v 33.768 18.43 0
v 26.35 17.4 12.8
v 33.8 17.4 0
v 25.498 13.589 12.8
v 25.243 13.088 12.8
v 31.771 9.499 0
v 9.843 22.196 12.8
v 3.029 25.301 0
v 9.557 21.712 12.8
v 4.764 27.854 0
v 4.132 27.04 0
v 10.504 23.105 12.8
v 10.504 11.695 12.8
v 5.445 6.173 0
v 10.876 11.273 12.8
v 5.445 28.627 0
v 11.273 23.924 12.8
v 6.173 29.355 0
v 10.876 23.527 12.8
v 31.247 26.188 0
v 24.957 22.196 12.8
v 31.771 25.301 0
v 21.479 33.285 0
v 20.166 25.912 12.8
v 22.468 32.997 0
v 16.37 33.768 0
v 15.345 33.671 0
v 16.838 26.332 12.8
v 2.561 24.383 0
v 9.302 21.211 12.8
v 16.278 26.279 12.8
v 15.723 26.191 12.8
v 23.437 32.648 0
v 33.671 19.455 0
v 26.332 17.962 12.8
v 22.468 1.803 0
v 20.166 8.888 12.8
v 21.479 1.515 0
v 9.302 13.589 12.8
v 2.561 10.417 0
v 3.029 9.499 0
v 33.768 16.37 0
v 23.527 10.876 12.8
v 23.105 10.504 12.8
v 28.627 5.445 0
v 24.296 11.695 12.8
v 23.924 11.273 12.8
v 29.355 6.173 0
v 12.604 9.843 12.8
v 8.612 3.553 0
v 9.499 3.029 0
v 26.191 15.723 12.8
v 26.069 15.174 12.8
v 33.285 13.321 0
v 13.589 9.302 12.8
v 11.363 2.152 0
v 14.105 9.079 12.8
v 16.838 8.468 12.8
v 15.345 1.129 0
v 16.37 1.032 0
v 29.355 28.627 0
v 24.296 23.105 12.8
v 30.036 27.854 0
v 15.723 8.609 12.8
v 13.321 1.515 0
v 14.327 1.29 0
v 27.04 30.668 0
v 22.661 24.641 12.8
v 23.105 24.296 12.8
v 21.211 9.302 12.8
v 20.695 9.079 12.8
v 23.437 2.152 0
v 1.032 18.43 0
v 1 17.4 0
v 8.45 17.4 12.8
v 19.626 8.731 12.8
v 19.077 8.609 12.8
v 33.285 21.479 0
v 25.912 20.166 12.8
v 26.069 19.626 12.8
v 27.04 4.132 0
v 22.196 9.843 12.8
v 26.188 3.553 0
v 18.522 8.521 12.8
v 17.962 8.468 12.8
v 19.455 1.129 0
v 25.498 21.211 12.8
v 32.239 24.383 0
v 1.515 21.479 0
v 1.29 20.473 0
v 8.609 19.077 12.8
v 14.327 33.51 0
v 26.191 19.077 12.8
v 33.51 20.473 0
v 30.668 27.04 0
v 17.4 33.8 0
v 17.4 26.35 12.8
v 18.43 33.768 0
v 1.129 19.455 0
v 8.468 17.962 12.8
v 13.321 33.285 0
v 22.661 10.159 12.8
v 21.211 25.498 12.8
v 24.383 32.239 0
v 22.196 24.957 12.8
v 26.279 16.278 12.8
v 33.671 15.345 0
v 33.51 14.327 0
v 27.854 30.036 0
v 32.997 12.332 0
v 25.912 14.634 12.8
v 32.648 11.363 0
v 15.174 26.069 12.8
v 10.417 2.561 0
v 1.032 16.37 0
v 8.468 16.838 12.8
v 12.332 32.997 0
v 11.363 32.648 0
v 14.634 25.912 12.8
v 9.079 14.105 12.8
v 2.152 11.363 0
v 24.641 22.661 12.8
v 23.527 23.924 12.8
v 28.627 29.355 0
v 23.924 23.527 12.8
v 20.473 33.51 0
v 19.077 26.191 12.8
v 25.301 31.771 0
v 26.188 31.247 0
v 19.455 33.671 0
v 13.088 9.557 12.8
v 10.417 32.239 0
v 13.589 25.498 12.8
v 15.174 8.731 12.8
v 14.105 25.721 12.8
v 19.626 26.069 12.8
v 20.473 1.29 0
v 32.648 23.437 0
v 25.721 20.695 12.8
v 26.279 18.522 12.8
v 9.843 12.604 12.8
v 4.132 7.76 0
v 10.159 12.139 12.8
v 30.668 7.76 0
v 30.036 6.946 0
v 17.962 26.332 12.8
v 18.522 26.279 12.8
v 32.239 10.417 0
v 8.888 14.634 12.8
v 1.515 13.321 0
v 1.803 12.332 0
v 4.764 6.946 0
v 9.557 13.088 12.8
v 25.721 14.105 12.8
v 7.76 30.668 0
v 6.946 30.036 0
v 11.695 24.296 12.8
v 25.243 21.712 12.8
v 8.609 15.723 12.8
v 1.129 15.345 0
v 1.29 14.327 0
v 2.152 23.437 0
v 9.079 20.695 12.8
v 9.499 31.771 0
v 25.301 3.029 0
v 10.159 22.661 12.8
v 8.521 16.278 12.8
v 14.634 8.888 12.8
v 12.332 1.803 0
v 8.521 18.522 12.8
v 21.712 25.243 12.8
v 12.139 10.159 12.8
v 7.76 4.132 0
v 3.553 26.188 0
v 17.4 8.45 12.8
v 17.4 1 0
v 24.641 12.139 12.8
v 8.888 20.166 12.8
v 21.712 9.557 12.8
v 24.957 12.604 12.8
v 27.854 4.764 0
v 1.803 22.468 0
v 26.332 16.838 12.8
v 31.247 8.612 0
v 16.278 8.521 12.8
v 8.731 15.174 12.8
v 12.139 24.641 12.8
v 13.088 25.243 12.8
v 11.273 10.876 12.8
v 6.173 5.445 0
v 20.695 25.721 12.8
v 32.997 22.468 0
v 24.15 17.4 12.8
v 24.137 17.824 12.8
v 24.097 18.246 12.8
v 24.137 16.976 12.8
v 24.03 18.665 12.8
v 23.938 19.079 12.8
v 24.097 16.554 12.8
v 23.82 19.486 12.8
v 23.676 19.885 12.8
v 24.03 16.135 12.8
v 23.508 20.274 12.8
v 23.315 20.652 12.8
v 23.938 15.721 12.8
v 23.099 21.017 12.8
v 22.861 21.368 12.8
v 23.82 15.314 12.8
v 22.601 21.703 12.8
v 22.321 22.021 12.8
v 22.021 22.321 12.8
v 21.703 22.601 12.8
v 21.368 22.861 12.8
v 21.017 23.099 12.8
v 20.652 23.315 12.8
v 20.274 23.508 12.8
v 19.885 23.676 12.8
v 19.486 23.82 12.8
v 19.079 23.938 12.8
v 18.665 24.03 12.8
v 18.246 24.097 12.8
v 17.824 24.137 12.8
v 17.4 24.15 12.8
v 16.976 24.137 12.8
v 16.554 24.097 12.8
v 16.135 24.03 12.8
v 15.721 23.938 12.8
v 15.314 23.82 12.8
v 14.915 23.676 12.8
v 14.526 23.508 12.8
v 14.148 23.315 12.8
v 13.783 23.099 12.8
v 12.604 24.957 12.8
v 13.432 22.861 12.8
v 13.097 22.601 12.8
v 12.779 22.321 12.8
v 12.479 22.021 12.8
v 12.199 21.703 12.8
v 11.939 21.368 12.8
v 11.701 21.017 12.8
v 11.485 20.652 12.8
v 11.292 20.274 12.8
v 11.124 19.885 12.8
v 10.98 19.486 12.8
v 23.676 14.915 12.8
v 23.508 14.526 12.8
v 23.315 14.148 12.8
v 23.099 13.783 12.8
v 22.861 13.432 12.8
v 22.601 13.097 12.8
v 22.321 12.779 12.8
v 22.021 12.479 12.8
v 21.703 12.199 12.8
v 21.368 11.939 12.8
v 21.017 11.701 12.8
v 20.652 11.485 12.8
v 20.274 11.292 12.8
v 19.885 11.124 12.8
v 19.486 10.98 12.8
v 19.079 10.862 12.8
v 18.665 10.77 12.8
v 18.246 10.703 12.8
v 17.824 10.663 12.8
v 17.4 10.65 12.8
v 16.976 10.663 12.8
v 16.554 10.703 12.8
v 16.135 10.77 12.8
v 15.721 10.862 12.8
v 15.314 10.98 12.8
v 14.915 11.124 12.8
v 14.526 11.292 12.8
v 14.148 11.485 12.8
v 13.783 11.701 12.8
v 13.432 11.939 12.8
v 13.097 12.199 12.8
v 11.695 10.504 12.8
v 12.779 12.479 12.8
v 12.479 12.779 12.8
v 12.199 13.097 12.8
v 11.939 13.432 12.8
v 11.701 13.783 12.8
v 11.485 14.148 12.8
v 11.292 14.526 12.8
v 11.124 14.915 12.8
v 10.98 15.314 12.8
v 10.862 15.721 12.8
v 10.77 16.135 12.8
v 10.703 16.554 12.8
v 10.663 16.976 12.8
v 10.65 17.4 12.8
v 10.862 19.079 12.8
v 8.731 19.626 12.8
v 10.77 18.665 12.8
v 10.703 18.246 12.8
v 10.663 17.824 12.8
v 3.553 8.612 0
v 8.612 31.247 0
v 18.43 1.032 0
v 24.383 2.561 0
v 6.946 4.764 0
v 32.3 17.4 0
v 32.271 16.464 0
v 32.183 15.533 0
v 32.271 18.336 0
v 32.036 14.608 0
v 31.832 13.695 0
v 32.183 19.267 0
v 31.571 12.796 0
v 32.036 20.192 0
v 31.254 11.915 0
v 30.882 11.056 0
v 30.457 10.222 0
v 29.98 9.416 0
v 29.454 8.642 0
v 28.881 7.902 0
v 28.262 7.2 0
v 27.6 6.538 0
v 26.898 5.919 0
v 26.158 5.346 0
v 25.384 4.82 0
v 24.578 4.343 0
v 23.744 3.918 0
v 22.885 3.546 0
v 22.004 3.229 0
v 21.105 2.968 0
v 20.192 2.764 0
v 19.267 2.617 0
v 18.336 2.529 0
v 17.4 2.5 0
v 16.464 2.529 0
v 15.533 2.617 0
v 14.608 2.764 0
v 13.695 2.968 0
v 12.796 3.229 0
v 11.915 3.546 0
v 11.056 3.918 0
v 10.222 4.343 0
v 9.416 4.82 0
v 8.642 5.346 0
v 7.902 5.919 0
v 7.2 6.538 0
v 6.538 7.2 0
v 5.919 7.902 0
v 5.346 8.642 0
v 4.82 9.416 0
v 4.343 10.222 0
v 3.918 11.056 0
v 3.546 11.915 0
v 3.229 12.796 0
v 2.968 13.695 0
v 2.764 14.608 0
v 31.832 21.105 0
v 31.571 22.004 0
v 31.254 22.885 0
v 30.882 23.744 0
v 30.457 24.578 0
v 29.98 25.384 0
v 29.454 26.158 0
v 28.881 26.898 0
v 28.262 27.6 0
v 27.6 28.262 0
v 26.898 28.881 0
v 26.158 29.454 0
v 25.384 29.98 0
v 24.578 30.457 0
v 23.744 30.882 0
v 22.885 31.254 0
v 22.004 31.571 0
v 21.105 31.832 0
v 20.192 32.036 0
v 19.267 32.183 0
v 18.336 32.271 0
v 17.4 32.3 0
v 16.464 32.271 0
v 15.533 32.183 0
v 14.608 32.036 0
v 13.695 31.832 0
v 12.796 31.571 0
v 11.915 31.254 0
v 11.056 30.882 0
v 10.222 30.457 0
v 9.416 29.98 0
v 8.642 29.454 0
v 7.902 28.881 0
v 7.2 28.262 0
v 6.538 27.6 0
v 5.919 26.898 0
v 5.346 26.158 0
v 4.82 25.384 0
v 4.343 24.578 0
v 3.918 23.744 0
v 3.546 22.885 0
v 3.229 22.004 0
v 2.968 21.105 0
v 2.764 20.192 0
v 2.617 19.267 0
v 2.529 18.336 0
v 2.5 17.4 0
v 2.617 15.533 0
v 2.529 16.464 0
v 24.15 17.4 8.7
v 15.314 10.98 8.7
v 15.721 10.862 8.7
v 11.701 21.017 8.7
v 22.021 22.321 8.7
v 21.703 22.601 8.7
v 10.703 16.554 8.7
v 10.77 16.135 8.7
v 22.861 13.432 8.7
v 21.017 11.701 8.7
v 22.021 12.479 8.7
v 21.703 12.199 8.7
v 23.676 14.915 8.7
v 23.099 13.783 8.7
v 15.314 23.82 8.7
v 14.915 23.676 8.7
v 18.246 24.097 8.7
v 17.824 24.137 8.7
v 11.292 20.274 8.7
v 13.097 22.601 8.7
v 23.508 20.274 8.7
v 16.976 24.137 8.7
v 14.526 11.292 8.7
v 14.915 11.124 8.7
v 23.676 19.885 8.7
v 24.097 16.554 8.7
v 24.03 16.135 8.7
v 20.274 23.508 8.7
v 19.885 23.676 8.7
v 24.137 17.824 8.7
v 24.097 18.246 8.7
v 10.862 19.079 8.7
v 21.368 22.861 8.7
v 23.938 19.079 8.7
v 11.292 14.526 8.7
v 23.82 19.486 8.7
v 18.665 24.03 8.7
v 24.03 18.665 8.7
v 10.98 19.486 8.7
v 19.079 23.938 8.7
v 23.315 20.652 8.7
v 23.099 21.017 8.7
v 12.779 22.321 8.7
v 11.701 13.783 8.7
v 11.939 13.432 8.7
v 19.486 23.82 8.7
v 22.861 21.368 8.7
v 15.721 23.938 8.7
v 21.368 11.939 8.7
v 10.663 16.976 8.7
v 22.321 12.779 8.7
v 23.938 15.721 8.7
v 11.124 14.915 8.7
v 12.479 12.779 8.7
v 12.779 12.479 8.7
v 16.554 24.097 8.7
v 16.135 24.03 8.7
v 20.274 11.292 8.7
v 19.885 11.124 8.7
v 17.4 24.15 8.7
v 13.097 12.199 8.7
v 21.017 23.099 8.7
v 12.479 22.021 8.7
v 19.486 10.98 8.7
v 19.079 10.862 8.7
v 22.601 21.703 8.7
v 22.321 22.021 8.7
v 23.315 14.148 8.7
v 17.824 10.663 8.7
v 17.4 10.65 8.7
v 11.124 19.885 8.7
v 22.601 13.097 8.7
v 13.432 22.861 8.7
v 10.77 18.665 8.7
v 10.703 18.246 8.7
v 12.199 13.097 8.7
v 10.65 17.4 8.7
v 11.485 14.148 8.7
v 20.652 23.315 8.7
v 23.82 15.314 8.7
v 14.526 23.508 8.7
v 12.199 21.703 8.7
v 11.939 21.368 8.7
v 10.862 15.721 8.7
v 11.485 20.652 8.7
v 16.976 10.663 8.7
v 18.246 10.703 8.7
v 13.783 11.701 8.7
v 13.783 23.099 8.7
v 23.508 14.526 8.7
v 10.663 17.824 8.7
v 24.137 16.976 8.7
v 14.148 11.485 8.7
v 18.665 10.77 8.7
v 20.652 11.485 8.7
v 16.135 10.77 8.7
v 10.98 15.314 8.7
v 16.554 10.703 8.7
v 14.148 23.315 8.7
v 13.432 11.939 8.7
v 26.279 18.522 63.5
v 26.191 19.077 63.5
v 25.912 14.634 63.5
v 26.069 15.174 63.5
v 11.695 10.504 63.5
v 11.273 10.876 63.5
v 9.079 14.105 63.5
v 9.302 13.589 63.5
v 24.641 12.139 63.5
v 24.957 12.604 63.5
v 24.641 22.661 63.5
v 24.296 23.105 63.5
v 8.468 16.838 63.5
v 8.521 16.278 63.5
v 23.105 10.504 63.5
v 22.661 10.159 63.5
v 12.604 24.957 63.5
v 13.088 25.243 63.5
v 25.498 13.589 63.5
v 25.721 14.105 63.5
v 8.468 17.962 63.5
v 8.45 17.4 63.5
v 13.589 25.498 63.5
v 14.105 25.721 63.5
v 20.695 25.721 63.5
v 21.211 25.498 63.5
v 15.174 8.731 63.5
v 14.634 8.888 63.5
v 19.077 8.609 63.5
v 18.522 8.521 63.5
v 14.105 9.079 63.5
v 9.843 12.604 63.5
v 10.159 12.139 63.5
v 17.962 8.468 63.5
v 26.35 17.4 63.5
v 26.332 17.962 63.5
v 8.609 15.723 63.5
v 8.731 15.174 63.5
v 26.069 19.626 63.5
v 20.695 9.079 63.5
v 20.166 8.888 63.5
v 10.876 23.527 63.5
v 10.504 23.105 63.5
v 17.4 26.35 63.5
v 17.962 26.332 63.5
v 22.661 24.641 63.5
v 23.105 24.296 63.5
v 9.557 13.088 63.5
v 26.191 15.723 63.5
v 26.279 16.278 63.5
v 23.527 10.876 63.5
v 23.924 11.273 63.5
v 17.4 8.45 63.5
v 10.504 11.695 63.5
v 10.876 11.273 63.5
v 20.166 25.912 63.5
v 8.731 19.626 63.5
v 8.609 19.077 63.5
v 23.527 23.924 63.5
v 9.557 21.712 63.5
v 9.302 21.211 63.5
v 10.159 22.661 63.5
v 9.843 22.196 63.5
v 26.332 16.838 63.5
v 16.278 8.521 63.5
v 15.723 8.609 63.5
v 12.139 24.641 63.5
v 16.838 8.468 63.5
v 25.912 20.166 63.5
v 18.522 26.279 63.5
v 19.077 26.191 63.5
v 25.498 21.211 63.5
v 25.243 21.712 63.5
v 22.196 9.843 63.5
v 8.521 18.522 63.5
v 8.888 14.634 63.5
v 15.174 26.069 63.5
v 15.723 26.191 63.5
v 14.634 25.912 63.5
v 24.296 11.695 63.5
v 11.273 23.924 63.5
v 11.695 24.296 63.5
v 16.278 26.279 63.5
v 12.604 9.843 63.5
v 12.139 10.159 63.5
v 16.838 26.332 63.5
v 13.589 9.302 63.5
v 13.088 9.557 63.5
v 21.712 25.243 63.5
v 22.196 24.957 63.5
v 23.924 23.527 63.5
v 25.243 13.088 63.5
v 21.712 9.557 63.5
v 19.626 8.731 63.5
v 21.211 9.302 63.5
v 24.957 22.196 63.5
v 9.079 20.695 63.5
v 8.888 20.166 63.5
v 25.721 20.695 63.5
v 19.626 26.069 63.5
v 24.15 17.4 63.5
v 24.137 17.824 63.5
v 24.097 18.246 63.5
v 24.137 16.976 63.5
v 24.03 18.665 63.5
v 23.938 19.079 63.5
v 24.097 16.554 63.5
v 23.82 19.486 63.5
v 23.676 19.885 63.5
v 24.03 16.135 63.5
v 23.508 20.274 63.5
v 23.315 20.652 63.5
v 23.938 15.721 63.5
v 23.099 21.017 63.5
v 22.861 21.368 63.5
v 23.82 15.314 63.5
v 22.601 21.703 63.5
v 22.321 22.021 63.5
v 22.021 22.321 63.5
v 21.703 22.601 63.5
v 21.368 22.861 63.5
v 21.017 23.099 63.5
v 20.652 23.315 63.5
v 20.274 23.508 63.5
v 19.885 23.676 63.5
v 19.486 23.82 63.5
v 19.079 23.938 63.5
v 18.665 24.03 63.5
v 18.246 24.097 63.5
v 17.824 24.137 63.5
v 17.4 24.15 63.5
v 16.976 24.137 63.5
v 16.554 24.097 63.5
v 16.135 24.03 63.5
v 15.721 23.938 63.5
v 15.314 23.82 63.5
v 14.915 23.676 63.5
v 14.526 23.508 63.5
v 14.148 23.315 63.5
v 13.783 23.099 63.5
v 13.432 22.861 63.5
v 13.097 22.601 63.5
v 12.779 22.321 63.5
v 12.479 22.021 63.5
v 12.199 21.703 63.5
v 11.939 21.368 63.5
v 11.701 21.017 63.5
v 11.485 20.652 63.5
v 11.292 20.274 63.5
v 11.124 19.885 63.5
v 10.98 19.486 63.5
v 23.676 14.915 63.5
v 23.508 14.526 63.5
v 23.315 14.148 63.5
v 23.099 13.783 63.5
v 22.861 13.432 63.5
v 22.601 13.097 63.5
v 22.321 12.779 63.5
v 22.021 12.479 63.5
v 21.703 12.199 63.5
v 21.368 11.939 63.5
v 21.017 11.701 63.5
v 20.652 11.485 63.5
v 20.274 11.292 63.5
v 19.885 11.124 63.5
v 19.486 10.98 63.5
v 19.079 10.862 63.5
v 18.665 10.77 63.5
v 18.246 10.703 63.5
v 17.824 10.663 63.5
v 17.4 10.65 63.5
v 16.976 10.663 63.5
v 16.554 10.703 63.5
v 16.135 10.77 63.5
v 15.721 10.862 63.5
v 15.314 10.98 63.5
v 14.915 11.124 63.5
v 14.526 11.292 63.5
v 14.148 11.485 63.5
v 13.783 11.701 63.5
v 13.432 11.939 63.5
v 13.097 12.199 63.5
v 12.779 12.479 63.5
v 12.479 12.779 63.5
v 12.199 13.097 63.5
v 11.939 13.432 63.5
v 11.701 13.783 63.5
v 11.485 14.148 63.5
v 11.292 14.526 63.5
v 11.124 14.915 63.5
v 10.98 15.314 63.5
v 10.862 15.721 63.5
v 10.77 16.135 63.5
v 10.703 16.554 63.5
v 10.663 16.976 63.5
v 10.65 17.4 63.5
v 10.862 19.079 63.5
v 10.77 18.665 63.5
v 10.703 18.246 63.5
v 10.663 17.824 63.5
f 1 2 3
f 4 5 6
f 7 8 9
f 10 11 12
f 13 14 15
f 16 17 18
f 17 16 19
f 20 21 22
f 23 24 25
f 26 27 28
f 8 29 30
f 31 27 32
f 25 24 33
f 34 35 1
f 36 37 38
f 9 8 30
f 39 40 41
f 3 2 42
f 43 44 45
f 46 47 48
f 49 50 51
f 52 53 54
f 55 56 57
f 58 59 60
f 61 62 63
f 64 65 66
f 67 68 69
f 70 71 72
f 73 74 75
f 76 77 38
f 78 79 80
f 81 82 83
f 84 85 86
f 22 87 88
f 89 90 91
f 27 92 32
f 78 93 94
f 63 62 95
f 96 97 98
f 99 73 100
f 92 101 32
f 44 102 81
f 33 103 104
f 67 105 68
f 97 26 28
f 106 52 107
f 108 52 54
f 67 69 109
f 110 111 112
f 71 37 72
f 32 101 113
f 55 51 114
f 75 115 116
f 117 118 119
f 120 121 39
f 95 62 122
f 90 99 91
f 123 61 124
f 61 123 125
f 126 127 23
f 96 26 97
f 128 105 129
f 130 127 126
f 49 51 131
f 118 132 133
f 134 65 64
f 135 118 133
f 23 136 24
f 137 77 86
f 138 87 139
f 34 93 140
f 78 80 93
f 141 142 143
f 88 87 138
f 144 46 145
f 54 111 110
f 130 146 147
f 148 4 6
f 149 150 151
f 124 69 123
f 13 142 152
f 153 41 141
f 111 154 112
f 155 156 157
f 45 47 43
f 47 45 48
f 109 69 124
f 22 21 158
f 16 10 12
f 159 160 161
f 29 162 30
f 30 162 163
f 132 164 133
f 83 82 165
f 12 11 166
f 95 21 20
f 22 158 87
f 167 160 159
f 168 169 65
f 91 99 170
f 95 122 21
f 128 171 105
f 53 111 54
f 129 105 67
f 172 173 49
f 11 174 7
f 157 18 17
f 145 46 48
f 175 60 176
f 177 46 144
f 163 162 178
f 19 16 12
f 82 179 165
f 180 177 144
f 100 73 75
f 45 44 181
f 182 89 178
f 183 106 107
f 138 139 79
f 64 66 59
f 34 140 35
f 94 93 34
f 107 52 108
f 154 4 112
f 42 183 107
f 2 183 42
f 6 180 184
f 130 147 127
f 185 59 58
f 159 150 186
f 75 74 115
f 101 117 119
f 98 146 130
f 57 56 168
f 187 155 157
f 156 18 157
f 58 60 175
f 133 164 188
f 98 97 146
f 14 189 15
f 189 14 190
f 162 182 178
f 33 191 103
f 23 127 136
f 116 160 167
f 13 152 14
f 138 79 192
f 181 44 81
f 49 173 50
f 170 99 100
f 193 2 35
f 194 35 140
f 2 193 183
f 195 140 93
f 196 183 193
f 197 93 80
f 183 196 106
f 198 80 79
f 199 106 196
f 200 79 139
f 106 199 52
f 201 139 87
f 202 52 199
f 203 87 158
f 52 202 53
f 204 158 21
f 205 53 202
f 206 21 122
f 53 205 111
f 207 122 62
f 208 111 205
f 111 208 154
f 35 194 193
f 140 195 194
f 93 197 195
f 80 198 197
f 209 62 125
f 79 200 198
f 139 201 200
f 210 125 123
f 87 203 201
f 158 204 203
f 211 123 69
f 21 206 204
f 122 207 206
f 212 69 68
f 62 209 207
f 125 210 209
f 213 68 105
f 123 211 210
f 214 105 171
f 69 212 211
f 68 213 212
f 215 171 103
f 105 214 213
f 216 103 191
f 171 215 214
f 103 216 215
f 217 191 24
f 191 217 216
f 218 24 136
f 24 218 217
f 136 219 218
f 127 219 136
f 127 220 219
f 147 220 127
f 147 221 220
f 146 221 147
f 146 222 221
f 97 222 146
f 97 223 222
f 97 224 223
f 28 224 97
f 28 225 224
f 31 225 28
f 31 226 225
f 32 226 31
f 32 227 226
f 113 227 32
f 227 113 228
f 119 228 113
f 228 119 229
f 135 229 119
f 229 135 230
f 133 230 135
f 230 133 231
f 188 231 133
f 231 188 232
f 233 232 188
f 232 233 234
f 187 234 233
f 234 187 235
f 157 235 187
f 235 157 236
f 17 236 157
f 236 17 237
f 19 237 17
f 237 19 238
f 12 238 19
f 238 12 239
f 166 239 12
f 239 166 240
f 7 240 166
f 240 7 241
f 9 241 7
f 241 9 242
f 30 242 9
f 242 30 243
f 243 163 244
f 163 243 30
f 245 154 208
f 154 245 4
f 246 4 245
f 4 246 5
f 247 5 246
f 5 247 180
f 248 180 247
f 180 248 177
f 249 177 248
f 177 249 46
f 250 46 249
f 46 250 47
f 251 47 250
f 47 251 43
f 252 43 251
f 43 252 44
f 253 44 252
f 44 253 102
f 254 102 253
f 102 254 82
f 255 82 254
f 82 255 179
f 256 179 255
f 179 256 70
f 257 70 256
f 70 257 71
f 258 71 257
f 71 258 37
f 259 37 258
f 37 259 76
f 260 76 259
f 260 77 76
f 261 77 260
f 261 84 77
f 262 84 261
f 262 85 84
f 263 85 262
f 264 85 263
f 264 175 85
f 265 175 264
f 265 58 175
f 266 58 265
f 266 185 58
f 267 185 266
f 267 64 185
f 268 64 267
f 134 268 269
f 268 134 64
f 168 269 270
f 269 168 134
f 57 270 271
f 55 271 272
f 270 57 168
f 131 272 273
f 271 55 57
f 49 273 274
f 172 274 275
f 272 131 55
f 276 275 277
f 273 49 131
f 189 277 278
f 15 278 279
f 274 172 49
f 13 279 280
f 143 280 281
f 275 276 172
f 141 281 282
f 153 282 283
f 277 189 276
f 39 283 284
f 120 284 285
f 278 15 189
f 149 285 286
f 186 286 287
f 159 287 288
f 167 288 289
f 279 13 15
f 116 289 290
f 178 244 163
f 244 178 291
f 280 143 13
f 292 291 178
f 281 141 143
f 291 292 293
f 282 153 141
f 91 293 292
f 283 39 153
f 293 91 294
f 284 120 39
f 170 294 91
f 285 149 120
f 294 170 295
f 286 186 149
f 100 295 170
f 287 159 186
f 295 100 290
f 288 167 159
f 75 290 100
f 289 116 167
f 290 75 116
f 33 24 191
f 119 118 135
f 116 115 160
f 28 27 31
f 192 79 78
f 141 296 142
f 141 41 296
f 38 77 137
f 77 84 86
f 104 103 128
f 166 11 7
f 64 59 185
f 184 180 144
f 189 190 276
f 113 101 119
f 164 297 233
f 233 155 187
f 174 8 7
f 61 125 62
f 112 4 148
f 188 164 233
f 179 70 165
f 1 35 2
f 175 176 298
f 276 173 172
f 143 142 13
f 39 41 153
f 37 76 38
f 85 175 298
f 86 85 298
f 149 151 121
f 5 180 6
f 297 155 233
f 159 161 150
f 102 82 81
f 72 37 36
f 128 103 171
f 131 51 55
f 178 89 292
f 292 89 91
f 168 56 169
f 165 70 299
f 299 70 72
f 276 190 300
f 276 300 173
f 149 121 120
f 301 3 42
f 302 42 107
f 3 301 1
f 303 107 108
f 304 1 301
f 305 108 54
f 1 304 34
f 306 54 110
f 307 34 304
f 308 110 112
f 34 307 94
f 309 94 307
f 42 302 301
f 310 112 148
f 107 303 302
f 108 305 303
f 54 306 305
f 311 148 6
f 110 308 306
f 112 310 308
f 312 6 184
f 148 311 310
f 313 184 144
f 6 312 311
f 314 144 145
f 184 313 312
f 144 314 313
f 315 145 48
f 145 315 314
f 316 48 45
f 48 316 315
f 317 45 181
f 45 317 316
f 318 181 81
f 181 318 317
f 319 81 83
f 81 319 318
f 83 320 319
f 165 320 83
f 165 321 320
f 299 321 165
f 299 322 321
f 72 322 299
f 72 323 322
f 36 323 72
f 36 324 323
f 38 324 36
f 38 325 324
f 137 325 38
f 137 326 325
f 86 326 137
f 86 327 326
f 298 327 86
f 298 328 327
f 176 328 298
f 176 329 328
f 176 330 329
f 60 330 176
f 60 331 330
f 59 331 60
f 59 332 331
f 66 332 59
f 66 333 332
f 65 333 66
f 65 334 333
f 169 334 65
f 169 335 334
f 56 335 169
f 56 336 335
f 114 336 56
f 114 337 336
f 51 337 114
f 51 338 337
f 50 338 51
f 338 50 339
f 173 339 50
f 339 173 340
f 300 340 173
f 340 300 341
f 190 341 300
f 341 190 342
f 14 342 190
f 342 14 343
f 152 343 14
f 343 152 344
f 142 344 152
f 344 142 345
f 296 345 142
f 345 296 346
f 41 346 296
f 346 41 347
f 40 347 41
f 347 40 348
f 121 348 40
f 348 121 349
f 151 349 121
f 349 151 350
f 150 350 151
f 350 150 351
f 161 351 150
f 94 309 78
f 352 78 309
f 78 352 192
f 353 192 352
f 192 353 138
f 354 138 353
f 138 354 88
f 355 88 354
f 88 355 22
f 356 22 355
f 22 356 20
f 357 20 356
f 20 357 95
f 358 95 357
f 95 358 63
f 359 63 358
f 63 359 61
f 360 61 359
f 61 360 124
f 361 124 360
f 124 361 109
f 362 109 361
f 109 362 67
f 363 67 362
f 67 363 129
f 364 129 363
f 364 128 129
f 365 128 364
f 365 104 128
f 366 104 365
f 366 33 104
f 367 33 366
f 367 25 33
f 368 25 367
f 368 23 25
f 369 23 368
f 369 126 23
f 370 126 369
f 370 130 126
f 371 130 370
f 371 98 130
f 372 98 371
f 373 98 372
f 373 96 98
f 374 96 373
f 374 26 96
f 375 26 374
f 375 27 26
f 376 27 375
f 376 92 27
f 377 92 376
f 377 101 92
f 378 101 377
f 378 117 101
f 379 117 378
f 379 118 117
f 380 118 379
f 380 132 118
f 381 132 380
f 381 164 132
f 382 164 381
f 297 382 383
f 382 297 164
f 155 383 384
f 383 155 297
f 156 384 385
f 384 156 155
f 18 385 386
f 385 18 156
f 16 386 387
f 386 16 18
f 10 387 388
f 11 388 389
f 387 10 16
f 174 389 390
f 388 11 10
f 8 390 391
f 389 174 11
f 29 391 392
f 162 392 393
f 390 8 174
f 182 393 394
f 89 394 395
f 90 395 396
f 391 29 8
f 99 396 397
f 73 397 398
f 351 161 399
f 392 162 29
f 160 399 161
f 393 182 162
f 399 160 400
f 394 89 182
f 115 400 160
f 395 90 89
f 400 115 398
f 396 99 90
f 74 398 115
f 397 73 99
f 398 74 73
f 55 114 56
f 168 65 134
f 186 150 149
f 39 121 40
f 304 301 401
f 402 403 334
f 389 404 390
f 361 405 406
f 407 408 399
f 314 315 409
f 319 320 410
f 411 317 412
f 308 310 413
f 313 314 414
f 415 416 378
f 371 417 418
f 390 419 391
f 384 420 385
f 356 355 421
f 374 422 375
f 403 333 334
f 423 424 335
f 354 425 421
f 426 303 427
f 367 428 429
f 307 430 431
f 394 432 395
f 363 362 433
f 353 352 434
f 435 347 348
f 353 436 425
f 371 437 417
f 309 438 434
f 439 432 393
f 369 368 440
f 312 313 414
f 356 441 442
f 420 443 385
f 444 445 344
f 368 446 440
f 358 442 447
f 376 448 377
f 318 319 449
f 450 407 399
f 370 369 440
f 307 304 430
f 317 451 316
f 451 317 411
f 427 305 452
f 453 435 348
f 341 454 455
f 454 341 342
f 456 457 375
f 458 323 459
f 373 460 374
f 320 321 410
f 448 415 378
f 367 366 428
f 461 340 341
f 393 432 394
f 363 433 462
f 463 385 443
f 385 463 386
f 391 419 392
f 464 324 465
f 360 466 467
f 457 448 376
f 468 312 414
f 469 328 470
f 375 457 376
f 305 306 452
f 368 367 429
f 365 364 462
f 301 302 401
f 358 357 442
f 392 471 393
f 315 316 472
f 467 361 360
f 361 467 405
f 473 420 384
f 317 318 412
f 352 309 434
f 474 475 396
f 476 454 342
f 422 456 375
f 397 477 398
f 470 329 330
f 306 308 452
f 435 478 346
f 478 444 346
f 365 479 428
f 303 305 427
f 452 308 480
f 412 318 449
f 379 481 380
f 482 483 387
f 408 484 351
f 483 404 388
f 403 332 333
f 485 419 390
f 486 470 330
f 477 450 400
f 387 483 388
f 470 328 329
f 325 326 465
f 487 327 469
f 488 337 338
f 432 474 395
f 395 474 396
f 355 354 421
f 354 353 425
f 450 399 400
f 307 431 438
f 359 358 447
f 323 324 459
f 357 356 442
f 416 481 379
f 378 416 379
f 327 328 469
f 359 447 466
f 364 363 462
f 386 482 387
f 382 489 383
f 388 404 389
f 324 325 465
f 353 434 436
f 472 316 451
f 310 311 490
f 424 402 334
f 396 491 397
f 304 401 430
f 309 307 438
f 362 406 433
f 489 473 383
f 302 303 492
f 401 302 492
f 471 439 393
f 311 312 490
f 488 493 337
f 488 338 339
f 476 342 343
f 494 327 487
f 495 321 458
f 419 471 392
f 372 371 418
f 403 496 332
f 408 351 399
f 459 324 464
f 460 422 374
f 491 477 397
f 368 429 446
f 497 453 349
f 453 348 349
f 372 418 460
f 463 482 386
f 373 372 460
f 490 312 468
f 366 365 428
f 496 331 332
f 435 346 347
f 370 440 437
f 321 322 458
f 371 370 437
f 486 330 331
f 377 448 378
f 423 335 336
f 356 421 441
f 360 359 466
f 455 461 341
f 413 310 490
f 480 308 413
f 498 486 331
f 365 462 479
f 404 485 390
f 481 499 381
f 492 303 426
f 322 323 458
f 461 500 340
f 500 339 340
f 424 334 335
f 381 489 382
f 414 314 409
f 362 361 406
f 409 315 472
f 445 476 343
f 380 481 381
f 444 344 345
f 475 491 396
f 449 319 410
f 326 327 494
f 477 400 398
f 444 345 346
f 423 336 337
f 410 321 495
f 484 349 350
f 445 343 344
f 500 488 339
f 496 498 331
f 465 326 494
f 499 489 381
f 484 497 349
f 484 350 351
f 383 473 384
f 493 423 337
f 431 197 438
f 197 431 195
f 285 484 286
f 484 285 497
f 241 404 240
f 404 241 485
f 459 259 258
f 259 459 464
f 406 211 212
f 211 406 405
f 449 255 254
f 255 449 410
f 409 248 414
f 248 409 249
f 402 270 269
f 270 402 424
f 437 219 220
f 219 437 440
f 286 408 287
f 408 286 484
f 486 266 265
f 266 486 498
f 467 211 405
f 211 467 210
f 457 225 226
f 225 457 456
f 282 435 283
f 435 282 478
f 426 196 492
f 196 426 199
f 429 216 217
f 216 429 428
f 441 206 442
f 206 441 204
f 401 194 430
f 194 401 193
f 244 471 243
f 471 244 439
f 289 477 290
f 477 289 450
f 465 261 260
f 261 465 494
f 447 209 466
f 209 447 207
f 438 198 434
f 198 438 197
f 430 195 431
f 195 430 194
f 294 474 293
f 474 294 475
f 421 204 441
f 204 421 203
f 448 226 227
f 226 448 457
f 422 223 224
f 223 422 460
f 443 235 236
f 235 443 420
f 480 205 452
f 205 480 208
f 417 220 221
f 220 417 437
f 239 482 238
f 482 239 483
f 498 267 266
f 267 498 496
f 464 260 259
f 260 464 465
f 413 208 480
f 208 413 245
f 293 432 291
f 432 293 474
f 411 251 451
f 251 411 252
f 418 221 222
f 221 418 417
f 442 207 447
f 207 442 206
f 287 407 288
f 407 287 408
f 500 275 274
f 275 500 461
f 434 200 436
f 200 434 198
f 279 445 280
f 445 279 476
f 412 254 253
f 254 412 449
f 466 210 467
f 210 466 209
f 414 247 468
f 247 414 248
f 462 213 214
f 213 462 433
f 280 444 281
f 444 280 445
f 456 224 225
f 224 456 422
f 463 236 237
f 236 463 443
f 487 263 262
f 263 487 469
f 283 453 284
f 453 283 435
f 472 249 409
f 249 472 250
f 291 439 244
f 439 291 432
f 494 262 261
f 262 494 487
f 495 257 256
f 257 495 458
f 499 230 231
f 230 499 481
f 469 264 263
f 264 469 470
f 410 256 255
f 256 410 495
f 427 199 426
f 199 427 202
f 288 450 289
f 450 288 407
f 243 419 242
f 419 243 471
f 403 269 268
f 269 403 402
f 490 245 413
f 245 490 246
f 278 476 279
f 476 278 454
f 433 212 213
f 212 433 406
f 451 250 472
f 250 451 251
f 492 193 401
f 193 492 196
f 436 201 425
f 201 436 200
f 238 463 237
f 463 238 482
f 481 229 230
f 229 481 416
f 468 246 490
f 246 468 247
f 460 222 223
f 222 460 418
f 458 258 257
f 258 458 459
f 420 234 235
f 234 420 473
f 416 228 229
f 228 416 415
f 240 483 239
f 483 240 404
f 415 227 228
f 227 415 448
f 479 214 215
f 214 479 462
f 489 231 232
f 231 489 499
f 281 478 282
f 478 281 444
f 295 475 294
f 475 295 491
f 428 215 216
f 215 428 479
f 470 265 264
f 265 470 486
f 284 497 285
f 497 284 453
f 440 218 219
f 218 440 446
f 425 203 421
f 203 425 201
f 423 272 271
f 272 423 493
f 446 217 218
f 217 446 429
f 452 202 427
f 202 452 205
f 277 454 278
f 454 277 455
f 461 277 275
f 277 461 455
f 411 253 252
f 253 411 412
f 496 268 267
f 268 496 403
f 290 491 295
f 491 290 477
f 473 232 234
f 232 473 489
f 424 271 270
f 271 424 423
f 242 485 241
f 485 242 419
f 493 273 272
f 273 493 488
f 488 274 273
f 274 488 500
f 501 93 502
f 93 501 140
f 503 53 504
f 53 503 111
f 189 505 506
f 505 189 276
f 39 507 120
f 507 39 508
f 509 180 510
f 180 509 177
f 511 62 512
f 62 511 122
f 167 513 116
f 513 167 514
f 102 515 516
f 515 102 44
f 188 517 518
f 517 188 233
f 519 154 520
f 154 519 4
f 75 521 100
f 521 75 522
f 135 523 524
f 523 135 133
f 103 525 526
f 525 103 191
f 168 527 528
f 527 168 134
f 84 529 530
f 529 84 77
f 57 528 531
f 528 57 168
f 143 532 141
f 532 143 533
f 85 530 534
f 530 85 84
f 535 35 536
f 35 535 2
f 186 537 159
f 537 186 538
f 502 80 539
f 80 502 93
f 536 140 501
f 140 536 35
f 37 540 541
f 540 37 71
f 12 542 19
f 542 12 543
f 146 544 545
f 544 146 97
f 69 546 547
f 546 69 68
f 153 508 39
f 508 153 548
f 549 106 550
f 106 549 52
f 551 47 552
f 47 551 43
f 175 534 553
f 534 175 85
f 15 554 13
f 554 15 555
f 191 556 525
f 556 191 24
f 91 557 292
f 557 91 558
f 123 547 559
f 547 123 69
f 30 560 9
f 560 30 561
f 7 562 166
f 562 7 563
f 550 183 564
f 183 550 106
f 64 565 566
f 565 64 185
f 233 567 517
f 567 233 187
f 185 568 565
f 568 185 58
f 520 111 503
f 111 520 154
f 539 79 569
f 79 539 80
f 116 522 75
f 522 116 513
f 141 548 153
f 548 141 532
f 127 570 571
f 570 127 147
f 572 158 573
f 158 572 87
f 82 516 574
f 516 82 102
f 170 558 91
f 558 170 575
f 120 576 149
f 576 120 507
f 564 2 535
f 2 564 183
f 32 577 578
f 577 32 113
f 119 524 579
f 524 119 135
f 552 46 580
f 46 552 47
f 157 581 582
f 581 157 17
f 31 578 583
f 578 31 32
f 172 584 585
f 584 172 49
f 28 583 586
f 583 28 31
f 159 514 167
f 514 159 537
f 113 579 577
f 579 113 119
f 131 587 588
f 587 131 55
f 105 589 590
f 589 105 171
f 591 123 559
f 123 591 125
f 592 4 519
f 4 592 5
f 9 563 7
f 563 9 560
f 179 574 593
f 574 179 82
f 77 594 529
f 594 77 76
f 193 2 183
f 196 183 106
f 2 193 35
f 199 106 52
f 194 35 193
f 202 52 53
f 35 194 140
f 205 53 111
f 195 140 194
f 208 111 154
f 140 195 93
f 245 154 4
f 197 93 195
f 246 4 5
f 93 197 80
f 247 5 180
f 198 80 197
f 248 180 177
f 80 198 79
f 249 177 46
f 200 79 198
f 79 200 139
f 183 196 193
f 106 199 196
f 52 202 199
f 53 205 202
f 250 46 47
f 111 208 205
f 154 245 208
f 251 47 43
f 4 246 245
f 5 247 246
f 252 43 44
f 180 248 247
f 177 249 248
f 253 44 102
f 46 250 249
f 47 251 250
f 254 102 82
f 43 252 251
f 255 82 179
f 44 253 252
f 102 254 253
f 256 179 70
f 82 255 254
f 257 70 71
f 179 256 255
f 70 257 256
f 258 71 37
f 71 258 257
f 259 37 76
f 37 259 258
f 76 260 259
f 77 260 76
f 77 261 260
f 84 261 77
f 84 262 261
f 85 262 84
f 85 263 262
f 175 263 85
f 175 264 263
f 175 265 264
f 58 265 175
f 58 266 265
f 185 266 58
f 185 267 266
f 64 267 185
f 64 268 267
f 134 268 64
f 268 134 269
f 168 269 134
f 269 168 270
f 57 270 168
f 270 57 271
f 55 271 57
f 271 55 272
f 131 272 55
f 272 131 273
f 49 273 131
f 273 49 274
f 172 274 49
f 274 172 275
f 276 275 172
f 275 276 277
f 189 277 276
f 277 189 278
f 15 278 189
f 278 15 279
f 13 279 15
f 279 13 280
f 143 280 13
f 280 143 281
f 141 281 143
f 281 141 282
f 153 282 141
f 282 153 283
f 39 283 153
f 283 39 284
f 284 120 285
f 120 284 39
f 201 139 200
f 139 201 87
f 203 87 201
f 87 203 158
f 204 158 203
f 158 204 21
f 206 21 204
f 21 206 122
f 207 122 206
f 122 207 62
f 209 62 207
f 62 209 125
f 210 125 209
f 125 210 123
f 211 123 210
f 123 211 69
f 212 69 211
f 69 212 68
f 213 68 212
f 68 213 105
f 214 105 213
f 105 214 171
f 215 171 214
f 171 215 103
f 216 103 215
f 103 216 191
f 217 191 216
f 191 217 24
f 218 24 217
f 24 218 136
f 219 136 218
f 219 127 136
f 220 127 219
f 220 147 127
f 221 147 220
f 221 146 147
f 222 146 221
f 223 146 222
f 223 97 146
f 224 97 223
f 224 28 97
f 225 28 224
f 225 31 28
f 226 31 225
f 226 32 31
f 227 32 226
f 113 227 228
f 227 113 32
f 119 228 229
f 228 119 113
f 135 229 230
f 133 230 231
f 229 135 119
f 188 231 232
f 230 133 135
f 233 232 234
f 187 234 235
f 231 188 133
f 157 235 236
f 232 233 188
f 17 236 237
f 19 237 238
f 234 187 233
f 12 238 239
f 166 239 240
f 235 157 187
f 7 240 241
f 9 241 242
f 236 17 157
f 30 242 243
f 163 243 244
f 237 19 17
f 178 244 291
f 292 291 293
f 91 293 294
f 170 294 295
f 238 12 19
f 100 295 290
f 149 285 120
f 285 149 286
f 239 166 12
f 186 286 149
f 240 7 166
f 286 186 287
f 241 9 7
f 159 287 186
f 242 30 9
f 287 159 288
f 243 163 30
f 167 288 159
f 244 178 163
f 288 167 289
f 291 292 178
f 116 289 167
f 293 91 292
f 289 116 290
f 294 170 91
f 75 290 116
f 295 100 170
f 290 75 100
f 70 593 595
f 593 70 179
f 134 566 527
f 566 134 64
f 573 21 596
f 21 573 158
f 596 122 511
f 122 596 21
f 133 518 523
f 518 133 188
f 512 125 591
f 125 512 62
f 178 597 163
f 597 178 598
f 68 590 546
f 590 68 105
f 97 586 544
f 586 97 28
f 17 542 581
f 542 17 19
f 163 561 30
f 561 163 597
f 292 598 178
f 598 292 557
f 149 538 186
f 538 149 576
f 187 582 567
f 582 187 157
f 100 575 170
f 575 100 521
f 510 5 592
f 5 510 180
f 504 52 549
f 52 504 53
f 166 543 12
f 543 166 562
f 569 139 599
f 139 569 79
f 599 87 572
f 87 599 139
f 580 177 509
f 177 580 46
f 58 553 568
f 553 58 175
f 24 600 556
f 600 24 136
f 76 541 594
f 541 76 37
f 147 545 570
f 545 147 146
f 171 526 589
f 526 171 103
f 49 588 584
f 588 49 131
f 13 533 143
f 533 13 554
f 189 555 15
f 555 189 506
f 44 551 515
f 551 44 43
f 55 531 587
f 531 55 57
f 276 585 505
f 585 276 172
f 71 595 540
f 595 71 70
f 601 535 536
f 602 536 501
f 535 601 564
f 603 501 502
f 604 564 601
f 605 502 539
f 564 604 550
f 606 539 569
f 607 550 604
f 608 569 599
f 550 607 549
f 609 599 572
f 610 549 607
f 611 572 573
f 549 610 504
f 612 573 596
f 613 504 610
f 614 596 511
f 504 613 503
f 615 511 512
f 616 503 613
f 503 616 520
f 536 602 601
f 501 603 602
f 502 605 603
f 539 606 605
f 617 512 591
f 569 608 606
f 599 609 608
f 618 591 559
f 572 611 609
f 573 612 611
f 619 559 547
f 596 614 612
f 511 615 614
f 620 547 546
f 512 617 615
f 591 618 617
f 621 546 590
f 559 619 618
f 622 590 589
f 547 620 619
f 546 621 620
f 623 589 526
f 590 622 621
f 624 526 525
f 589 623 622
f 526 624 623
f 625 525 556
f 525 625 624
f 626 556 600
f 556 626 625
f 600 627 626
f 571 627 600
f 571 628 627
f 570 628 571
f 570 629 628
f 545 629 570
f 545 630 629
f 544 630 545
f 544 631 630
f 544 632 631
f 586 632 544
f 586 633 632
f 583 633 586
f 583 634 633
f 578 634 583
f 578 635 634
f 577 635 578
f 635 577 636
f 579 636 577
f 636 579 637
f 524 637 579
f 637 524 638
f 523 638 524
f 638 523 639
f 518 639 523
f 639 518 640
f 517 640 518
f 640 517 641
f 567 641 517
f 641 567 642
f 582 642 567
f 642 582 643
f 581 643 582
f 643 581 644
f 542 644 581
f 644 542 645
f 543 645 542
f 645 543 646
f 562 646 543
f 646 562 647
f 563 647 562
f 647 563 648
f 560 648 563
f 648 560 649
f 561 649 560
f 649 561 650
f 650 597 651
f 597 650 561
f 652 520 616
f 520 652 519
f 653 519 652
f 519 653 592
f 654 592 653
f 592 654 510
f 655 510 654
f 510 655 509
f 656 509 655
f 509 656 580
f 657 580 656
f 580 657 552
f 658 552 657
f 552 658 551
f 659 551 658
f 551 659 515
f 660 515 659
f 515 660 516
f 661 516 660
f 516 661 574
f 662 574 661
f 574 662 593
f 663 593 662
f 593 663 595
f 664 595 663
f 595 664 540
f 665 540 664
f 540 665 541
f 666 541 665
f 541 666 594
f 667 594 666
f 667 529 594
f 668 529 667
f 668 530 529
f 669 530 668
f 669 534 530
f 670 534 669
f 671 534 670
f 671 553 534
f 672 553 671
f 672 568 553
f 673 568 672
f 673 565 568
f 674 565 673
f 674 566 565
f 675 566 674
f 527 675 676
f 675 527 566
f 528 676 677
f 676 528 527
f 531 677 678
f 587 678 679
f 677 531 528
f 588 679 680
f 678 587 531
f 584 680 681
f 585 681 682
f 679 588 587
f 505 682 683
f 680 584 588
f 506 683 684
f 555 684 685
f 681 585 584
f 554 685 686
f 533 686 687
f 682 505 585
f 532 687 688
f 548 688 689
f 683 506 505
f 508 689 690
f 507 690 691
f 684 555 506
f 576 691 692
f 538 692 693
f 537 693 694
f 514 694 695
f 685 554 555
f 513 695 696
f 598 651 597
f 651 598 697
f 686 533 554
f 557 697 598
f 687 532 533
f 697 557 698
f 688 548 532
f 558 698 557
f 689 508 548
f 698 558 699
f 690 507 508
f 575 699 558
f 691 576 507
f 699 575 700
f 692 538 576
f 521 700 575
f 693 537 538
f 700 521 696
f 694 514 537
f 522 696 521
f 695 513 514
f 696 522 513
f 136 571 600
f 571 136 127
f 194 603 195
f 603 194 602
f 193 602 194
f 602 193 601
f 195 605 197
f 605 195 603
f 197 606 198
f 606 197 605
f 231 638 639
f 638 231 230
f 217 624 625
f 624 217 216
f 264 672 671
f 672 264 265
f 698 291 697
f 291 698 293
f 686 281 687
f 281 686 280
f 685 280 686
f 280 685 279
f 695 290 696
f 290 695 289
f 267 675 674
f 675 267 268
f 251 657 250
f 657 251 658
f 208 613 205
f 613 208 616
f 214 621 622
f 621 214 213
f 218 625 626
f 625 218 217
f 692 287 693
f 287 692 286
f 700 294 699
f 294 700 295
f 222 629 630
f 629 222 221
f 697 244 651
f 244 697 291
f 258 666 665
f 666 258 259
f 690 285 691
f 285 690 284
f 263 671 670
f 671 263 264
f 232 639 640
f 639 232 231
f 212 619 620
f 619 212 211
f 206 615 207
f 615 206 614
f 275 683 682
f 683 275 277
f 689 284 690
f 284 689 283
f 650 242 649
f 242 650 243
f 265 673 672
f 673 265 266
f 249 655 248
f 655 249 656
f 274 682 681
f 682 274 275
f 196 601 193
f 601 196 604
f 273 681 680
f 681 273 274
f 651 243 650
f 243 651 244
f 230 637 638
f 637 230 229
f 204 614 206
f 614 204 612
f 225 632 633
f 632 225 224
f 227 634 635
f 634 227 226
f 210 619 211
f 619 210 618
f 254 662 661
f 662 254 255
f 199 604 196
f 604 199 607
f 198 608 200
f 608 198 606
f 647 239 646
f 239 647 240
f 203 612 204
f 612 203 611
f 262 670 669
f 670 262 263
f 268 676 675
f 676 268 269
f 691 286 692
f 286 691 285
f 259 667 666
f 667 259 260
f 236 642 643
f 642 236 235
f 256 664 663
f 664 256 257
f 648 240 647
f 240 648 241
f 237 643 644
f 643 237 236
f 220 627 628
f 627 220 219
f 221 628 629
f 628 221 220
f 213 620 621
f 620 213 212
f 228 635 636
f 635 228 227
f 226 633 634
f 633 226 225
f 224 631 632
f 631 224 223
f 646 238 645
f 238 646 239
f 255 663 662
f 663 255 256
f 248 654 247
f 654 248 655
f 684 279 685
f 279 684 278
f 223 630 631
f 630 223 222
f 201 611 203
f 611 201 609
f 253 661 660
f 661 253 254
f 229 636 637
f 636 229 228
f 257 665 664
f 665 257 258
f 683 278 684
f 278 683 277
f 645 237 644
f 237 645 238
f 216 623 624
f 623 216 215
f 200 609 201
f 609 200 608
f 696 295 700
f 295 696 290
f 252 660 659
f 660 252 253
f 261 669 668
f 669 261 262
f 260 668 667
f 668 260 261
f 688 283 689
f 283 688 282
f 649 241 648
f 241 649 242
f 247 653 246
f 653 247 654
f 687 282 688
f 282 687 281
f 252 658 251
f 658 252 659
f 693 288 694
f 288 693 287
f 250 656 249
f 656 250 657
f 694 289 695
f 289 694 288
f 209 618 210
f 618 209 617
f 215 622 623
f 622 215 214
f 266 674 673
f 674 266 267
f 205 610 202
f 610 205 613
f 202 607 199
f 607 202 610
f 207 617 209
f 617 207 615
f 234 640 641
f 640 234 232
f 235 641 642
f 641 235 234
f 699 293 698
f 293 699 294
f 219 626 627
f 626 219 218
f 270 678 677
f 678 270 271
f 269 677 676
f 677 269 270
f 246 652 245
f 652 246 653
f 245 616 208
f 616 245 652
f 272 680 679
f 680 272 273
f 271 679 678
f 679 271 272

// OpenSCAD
// single funnel v1.2
module funnel () {
		// Part 1, funnel

		// diameter 32.8 (radius , place (x.y) such that there is 1mm margin
		translate([17.4, 17.4, 0])
		union() {
			difference() { 	
				cylinder(h = 12.8, r1 = 16.4, r2 = 8.95, $fn = 100);		
				cylinder(h = 8.7, r1 = 14.9, r2 = 6.75, $fn = 100); // r1 = 15.4
				translate([0, 0, 8.7])
				cylinder(h = 7.5, r = 6.75, $fn = 100);
			}
			translate([0, 0, 12.8])
			difference() { 
				cylinder(h = 50.7, r = 8.95, $fn = 100);		
				cylinder(h = 50.7, r = 6.75, $fn = 100);
			}
		}
}

funnel();
